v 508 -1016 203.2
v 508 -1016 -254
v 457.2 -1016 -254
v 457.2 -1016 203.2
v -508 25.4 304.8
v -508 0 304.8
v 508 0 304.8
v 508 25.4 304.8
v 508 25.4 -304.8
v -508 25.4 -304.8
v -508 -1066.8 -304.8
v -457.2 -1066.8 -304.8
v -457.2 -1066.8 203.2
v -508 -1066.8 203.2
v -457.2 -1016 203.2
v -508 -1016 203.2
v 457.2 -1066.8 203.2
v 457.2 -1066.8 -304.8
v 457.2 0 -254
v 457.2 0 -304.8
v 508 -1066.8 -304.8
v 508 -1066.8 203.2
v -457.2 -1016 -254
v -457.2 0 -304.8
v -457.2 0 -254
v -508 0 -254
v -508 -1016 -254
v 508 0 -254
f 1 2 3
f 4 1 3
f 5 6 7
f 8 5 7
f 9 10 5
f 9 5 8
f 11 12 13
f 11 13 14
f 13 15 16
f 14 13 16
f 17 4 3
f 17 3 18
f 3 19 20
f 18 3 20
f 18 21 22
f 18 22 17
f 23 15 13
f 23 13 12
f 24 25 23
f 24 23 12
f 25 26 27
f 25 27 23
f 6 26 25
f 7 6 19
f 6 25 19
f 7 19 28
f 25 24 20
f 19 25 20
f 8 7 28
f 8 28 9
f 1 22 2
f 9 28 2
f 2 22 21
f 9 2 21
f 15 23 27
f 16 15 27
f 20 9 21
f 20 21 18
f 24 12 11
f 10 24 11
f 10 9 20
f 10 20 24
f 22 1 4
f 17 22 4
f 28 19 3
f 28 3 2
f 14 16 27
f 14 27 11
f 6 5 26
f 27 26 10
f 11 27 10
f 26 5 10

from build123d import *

# Parameters (mm, degrees)
SKETCH1_W           = 1016
SKETCH1_H           = 609.6
BOSS_EXTRUDE1_DEPTH = 25.4
SKETCH2_W           = 50.8
SKETCH2_H           = 50.8
BOSS_EXTRUDE2_DEPTH = 1016
SKETCH3_W           = 50.8
SKETCH3_H           = 508
BOSS_EXTRUDE3_DEPTH = 50.8


with BuildPart() as part:
    # Sketch1 → Boss-Extrude1 (new body)
    with BuildSketch(Plane(origin=(0, 0, 0), x_dir=(1, 0, 0), z_dir=(0, 1, 0))):
        Rectangle(SKETCH1_W, SKETCH1_H)
    extrude(amount=BOSS_EXTRUDE1_DEPTH)

    # Sketch2 → Boss-Extrude2 (add)
    with BuildSketch(Plane(origin=(0, 0, 0), x_dir=(1, 0, 0), z_dir=(0, 1, 0))):
        with Locations((-482.6, 279.4)):
            Rectangle(SKETCH2_W, SKETCH2_H)
        with Locations((482.6, 279.4)):
            Rectangle(SKETCH2_W, SKETCH2_H)
    extrude(amount=-BOSS_EXTRUDE2_DEPTH)

    # Sketch3 → Boss-Extrude3 (add)
    with BuildSketch(Plane(origin=(0, -1016, 0), x_dir=(-1, 0, 0), z_dir=(0, -1, 0))):
        with Locations((482.6, 50.8)):
            Rectangle(SKETCH3_W, SKETCH3_H)
        with Locations((-482.6, 50.8)):
            Rectangle(SKETCH3_W, SKETCH3_H)
    extrude(amount=BOSS_EXTRUDE3_DEPTH)


solid = part.part
